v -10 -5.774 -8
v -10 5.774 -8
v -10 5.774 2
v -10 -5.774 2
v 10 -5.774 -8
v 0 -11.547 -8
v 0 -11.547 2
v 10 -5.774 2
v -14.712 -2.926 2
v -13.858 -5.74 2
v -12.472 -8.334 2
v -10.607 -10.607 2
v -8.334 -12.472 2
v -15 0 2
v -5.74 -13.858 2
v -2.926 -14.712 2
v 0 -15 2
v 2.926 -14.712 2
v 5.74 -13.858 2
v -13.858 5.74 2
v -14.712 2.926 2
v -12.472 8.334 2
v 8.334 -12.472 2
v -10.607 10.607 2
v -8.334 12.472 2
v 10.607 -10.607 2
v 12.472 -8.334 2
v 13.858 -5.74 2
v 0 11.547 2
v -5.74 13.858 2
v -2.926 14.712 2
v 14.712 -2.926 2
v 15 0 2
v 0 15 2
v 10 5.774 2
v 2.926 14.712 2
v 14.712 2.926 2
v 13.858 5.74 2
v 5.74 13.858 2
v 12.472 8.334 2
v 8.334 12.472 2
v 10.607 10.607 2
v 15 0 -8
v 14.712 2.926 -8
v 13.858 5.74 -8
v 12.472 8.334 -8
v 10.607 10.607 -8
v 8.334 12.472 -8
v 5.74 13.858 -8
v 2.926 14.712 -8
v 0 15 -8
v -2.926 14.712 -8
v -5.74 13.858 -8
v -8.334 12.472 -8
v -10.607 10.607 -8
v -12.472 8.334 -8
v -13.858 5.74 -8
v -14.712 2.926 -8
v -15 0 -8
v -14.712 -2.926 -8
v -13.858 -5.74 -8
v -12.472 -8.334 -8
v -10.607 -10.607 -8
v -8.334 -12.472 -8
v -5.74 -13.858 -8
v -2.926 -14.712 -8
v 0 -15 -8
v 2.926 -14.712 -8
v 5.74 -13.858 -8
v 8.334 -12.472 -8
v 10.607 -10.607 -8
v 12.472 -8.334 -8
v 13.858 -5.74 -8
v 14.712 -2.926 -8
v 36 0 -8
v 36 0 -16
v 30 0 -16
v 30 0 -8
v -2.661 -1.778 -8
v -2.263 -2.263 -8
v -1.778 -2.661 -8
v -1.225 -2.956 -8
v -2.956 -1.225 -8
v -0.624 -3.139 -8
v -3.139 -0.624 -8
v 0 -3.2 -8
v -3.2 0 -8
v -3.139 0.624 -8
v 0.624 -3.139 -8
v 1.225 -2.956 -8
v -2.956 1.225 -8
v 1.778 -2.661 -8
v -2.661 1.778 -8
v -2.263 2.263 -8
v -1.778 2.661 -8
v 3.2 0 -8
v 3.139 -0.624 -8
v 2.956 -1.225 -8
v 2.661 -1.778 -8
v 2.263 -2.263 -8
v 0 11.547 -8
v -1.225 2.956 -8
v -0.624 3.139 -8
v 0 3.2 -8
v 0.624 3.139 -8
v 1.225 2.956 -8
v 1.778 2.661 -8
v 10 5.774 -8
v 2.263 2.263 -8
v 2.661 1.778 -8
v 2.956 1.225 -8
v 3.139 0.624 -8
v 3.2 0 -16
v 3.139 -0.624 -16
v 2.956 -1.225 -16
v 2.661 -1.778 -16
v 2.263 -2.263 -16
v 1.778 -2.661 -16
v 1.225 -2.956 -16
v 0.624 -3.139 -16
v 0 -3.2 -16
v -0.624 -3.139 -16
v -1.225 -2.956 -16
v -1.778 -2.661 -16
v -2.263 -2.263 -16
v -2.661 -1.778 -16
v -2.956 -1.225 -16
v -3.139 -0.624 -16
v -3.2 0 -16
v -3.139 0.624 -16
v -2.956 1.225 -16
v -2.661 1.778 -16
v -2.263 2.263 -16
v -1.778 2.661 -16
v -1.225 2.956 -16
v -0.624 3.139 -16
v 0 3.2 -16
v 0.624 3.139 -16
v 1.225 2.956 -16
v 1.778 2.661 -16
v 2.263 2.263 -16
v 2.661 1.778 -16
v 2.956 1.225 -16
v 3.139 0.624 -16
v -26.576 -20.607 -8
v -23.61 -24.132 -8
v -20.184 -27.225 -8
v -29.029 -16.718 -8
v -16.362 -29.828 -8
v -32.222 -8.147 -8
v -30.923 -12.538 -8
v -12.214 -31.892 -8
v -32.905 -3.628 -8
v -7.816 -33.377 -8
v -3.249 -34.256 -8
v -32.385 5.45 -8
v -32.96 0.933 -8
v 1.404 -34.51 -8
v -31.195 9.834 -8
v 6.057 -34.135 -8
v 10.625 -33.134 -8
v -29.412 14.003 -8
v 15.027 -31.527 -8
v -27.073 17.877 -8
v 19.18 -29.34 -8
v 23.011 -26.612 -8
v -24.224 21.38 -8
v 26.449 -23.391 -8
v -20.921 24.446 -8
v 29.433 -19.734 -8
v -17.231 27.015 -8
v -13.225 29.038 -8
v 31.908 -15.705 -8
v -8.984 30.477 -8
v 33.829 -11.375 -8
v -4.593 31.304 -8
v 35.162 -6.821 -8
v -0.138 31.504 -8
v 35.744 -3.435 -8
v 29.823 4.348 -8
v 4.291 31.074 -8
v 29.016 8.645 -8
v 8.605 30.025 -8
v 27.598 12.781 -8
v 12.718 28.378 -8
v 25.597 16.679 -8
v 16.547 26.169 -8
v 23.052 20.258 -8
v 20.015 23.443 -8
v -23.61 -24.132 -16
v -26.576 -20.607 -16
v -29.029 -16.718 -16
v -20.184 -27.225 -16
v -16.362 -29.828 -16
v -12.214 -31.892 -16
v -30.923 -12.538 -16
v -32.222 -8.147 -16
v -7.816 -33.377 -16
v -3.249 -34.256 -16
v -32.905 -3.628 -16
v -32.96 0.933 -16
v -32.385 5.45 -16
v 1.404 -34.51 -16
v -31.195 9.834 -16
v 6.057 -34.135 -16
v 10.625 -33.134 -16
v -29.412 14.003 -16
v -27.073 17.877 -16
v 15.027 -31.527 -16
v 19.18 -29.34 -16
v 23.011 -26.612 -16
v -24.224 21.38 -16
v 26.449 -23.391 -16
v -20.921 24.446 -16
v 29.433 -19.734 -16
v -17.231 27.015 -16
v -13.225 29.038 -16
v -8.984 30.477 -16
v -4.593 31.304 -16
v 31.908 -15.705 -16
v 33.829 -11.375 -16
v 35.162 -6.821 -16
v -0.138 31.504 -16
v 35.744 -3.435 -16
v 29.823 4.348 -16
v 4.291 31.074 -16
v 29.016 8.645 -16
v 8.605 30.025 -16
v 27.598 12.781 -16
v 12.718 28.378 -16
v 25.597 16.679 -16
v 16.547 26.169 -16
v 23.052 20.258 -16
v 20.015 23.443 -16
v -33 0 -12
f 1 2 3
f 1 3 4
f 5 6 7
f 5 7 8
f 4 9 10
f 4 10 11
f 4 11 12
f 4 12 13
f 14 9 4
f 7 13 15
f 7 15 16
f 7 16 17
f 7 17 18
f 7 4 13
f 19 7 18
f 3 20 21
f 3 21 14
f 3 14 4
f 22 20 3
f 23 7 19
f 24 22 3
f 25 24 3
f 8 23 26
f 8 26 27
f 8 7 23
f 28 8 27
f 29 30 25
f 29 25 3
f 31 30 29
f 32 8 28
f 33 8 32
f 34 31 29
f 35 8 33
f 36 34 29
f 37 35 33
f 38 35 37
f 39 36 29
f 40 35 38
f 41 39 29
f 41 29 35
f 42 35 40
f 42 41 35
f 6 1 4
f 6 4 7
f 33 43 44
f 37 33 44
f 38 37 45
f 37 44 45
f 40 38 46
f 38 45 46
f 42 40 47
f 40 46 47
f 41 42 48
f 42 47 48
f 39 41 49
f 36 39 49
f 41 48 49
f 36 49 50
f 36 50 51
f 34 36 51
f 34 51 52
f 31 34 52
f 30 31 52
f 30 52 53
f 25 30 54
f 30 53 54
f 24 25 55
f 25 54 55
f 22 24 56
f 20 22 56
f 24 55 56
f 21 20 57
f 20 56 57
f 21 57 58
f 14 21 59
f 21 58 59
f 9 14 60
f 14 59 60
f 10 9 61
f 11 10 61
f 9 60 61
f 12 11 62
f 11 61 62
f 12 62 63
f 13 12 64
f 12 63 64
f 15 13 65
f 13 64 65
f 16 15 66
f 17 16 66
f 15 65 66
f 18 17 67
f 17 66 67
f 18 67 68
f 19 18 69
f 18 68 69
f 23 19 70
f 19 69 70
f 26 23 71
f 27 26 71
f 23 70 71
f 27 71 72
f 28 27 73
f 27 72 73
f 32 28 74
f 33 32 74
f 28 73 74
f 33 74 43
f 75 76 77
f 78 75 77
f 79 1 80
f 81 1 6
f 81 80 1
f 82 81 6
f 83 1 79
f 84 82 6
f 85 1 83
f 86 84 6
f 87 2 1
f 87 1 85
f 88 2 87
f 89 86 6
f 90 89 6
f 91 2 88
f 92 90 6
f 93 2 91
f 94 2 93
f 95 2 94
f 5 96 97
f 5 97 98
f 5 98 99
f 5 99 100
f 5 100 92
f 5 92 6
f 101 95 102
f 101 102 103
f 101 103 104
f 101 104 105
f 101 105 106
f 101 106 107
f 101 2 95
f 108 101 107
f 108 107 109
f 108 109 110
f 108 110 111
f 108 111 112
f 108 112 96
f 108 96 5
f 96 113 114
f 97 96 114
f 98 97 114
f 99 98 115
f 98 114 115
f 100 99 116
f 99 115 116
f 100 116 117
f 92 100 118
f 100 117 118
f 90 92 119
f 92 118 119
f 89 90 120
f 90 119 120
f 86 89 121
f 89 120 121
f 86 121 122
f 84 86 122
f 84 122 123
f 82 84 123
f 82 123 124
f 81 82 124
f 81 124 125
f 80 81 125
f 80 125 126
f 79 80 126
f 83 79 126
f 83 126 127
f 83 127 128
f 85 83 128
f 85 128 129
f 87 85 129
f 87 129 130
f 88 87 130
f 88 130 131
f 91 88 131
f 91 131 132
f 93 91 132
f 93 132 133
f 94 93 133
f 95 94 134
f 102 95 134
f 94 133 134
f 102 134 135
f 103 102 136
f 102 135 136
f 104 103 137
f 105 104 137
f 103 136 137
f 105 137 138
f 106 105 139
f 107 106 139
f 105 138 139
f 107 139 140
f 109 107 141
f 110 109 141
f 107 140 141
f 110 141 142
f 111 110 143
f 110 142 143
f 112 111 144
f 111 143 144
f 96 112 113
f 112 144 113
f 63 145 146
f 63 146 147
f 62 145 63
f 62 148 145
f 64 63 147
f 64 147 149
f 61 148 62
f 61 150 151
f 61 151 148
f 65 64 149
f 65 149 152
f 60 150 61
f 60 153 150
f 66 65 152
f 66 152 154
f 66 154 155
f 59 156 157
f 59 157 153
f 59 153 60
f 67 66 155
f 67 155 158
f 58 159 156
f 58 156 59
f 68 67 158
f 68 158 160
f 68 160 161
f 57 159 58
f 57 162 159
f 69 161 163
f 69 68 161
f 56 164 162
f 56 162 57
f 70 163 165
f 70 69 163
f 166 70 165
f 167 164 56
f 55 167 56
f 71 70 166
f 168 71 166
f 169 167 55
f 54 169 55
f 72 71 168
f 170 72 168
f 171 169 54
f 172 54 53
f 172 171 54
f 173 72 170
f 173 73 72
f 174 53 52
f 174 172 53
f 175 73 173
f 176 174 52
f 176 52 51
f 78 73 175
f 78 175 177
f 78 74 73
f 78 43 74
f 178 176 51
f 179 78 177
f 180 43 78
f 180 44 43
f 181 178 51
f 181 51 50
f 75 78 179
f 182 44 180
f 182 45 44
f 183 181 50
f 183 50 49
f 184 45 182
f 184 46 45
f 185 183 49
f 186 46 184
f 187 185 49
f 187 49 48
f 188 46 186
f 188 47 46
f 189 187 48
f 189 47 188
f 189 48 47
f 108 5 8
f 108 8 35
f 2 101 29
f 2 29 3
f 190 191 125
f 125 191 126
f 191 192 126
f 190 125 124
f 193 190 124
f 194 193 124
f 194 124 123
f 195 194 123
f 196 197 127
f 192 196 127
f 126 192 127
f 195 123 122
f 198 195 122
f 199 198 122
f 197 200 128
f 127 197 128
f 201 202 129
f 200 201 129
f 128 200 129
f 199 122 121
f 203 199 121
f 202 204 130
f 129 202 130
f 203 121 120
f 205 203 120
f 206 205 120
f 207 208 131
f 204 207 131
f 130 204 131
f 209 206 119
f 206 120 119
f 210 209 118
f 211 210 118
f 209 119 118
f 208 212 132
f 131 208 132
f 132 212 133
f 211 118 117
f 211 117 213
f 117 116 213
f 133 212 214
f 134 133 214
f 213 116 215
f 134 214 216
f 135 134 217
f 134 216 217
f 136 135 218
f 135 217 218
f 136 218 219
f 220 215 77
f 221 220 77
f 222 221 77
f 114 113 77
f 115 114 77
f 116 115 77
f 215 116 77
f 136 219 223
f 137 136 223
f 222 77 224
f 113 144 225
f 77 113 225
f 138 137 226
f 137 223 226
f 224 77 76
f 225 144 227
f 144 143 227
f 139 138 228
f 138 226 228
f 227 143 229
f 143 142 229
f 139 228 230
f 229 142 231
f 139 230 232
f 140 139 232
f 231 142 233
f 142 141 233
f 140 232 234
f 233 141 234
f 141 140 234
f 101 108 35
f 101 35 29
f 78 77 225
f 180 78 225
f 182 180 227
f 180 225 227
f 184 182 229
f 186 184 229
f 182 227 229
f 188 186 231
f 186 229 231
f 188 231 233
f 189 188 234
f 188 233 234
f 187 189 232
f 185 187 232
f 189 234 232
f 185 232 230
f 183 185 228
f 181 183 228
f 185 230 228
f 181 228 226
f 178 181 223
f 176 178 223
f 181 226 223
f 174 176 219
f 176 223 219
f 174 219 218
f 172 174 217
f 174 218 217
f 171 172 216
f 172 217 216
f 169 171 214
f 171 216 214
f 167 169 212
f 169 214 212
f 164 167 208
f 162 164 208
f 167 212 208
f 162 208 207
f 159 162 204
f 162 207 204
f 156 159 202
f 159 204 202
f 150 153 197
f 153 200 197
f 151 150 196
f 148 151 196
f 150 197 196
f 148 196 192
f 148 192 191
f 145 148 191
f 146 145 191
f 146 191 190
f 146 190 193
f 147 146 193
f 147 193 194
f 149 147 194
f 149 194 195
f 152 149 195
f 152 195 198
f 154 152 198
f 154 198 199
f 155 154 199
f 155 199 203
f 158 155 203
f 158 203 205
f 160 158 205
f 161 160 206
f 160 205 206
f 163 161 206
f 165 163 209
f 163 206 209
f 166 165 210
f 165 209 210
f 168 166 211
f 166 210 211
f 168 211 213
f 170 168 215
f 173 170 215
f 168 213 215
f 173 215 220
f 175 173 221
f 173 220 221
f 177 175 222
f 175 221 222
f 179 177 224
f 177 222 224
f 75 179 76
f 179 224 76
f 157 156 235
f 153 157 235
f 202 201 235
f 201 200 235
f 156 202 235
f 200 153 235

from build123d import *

# Parameters (mm, degrees)
PAD_DEPTH    = 8
SKETCH019_R  = 15
PAD010_DEPTH = 10
SKETCH020_R  = 3.2
POCKET_DEPTH = 18.001


with BuildPart() as part:
    # Sketch018 → Pad (new body)
    with BuildSketch(Plane.XY):
        with BuildLine():
            add(Edge.make_bspline(
                [(30, 0), (30.272727, 8.56798), (27.853744, 17.307319), (22.653329, 25.278439), (14.950718, 31.494746), (5.420543, 35.088391), (-4.927781, 35.491962), (-14.908573, 32.583746), (-23.388897, 26.726717), (-29.493664, 18.678196), (-32.727273, 9.424778), (-33.272727, -9.424778), (-30.584573, -19.020915), (-24.845816, -27.754875), (-16.372589, -34.546103), (-5.913321, -38.44936), (5.420559, -38.852932), (16.330444, -35.635102), (25.581384, -29.203153), (32.224493, -20.391792), (35.727273, -10.281576), (36, 0)],
                knots=[0, 0, 0, 0, 0, 0, 0, 0, 0, 0, 0, 0, 3.181133, 3.181133, 3.181133, 3.181133, 3.181133, 3.181133, 3.181133, 3.181133, 3.181133, 3.181133, 6.362265, 6.362265, 6.362265, 6.362265, 6.362265, 6.362265, 6.362265, 6.362265, 6.362265, 6.362265, 6.362265, 6.362265], degree=11))
            Line((36, 0), (30, 0))
        make_face()
    extrude(amount=PAD_DEPTH)

    # Sketch019 (on Face4 of Pad) → Pad010 (join)
    with BuildSketch(Plane.XY.offset(8)):
        Circle(SKETCH019_R)
        Polygon((0, -11.547005), (10, -5.773503), (10, 5.773503), (0, 11.547005), (-10, 5.773503), (-10, -5.773503), align=None, mode=Mode.SUBTRACT)
    extrude(amount=PAD010_DEPTH)

    # Sketch020 (on Face3 of Pad010) → Pocket (cut, through all)
    with BuildSketch(Plane(origin=(0, 0, 0), x_dir=(1, 0, 0), z_dir=(0, 0, -1))):
        Circle(SKETCH020_R)
    extrude(amount=-POCKET_DEPTH, mode=Mode.SUBTRACT)


with BuildPart() as part_1:
    # Body005 placement: moved
    add(part.part.moved(Location((0, 0, -16))))


solid = part_1.part
